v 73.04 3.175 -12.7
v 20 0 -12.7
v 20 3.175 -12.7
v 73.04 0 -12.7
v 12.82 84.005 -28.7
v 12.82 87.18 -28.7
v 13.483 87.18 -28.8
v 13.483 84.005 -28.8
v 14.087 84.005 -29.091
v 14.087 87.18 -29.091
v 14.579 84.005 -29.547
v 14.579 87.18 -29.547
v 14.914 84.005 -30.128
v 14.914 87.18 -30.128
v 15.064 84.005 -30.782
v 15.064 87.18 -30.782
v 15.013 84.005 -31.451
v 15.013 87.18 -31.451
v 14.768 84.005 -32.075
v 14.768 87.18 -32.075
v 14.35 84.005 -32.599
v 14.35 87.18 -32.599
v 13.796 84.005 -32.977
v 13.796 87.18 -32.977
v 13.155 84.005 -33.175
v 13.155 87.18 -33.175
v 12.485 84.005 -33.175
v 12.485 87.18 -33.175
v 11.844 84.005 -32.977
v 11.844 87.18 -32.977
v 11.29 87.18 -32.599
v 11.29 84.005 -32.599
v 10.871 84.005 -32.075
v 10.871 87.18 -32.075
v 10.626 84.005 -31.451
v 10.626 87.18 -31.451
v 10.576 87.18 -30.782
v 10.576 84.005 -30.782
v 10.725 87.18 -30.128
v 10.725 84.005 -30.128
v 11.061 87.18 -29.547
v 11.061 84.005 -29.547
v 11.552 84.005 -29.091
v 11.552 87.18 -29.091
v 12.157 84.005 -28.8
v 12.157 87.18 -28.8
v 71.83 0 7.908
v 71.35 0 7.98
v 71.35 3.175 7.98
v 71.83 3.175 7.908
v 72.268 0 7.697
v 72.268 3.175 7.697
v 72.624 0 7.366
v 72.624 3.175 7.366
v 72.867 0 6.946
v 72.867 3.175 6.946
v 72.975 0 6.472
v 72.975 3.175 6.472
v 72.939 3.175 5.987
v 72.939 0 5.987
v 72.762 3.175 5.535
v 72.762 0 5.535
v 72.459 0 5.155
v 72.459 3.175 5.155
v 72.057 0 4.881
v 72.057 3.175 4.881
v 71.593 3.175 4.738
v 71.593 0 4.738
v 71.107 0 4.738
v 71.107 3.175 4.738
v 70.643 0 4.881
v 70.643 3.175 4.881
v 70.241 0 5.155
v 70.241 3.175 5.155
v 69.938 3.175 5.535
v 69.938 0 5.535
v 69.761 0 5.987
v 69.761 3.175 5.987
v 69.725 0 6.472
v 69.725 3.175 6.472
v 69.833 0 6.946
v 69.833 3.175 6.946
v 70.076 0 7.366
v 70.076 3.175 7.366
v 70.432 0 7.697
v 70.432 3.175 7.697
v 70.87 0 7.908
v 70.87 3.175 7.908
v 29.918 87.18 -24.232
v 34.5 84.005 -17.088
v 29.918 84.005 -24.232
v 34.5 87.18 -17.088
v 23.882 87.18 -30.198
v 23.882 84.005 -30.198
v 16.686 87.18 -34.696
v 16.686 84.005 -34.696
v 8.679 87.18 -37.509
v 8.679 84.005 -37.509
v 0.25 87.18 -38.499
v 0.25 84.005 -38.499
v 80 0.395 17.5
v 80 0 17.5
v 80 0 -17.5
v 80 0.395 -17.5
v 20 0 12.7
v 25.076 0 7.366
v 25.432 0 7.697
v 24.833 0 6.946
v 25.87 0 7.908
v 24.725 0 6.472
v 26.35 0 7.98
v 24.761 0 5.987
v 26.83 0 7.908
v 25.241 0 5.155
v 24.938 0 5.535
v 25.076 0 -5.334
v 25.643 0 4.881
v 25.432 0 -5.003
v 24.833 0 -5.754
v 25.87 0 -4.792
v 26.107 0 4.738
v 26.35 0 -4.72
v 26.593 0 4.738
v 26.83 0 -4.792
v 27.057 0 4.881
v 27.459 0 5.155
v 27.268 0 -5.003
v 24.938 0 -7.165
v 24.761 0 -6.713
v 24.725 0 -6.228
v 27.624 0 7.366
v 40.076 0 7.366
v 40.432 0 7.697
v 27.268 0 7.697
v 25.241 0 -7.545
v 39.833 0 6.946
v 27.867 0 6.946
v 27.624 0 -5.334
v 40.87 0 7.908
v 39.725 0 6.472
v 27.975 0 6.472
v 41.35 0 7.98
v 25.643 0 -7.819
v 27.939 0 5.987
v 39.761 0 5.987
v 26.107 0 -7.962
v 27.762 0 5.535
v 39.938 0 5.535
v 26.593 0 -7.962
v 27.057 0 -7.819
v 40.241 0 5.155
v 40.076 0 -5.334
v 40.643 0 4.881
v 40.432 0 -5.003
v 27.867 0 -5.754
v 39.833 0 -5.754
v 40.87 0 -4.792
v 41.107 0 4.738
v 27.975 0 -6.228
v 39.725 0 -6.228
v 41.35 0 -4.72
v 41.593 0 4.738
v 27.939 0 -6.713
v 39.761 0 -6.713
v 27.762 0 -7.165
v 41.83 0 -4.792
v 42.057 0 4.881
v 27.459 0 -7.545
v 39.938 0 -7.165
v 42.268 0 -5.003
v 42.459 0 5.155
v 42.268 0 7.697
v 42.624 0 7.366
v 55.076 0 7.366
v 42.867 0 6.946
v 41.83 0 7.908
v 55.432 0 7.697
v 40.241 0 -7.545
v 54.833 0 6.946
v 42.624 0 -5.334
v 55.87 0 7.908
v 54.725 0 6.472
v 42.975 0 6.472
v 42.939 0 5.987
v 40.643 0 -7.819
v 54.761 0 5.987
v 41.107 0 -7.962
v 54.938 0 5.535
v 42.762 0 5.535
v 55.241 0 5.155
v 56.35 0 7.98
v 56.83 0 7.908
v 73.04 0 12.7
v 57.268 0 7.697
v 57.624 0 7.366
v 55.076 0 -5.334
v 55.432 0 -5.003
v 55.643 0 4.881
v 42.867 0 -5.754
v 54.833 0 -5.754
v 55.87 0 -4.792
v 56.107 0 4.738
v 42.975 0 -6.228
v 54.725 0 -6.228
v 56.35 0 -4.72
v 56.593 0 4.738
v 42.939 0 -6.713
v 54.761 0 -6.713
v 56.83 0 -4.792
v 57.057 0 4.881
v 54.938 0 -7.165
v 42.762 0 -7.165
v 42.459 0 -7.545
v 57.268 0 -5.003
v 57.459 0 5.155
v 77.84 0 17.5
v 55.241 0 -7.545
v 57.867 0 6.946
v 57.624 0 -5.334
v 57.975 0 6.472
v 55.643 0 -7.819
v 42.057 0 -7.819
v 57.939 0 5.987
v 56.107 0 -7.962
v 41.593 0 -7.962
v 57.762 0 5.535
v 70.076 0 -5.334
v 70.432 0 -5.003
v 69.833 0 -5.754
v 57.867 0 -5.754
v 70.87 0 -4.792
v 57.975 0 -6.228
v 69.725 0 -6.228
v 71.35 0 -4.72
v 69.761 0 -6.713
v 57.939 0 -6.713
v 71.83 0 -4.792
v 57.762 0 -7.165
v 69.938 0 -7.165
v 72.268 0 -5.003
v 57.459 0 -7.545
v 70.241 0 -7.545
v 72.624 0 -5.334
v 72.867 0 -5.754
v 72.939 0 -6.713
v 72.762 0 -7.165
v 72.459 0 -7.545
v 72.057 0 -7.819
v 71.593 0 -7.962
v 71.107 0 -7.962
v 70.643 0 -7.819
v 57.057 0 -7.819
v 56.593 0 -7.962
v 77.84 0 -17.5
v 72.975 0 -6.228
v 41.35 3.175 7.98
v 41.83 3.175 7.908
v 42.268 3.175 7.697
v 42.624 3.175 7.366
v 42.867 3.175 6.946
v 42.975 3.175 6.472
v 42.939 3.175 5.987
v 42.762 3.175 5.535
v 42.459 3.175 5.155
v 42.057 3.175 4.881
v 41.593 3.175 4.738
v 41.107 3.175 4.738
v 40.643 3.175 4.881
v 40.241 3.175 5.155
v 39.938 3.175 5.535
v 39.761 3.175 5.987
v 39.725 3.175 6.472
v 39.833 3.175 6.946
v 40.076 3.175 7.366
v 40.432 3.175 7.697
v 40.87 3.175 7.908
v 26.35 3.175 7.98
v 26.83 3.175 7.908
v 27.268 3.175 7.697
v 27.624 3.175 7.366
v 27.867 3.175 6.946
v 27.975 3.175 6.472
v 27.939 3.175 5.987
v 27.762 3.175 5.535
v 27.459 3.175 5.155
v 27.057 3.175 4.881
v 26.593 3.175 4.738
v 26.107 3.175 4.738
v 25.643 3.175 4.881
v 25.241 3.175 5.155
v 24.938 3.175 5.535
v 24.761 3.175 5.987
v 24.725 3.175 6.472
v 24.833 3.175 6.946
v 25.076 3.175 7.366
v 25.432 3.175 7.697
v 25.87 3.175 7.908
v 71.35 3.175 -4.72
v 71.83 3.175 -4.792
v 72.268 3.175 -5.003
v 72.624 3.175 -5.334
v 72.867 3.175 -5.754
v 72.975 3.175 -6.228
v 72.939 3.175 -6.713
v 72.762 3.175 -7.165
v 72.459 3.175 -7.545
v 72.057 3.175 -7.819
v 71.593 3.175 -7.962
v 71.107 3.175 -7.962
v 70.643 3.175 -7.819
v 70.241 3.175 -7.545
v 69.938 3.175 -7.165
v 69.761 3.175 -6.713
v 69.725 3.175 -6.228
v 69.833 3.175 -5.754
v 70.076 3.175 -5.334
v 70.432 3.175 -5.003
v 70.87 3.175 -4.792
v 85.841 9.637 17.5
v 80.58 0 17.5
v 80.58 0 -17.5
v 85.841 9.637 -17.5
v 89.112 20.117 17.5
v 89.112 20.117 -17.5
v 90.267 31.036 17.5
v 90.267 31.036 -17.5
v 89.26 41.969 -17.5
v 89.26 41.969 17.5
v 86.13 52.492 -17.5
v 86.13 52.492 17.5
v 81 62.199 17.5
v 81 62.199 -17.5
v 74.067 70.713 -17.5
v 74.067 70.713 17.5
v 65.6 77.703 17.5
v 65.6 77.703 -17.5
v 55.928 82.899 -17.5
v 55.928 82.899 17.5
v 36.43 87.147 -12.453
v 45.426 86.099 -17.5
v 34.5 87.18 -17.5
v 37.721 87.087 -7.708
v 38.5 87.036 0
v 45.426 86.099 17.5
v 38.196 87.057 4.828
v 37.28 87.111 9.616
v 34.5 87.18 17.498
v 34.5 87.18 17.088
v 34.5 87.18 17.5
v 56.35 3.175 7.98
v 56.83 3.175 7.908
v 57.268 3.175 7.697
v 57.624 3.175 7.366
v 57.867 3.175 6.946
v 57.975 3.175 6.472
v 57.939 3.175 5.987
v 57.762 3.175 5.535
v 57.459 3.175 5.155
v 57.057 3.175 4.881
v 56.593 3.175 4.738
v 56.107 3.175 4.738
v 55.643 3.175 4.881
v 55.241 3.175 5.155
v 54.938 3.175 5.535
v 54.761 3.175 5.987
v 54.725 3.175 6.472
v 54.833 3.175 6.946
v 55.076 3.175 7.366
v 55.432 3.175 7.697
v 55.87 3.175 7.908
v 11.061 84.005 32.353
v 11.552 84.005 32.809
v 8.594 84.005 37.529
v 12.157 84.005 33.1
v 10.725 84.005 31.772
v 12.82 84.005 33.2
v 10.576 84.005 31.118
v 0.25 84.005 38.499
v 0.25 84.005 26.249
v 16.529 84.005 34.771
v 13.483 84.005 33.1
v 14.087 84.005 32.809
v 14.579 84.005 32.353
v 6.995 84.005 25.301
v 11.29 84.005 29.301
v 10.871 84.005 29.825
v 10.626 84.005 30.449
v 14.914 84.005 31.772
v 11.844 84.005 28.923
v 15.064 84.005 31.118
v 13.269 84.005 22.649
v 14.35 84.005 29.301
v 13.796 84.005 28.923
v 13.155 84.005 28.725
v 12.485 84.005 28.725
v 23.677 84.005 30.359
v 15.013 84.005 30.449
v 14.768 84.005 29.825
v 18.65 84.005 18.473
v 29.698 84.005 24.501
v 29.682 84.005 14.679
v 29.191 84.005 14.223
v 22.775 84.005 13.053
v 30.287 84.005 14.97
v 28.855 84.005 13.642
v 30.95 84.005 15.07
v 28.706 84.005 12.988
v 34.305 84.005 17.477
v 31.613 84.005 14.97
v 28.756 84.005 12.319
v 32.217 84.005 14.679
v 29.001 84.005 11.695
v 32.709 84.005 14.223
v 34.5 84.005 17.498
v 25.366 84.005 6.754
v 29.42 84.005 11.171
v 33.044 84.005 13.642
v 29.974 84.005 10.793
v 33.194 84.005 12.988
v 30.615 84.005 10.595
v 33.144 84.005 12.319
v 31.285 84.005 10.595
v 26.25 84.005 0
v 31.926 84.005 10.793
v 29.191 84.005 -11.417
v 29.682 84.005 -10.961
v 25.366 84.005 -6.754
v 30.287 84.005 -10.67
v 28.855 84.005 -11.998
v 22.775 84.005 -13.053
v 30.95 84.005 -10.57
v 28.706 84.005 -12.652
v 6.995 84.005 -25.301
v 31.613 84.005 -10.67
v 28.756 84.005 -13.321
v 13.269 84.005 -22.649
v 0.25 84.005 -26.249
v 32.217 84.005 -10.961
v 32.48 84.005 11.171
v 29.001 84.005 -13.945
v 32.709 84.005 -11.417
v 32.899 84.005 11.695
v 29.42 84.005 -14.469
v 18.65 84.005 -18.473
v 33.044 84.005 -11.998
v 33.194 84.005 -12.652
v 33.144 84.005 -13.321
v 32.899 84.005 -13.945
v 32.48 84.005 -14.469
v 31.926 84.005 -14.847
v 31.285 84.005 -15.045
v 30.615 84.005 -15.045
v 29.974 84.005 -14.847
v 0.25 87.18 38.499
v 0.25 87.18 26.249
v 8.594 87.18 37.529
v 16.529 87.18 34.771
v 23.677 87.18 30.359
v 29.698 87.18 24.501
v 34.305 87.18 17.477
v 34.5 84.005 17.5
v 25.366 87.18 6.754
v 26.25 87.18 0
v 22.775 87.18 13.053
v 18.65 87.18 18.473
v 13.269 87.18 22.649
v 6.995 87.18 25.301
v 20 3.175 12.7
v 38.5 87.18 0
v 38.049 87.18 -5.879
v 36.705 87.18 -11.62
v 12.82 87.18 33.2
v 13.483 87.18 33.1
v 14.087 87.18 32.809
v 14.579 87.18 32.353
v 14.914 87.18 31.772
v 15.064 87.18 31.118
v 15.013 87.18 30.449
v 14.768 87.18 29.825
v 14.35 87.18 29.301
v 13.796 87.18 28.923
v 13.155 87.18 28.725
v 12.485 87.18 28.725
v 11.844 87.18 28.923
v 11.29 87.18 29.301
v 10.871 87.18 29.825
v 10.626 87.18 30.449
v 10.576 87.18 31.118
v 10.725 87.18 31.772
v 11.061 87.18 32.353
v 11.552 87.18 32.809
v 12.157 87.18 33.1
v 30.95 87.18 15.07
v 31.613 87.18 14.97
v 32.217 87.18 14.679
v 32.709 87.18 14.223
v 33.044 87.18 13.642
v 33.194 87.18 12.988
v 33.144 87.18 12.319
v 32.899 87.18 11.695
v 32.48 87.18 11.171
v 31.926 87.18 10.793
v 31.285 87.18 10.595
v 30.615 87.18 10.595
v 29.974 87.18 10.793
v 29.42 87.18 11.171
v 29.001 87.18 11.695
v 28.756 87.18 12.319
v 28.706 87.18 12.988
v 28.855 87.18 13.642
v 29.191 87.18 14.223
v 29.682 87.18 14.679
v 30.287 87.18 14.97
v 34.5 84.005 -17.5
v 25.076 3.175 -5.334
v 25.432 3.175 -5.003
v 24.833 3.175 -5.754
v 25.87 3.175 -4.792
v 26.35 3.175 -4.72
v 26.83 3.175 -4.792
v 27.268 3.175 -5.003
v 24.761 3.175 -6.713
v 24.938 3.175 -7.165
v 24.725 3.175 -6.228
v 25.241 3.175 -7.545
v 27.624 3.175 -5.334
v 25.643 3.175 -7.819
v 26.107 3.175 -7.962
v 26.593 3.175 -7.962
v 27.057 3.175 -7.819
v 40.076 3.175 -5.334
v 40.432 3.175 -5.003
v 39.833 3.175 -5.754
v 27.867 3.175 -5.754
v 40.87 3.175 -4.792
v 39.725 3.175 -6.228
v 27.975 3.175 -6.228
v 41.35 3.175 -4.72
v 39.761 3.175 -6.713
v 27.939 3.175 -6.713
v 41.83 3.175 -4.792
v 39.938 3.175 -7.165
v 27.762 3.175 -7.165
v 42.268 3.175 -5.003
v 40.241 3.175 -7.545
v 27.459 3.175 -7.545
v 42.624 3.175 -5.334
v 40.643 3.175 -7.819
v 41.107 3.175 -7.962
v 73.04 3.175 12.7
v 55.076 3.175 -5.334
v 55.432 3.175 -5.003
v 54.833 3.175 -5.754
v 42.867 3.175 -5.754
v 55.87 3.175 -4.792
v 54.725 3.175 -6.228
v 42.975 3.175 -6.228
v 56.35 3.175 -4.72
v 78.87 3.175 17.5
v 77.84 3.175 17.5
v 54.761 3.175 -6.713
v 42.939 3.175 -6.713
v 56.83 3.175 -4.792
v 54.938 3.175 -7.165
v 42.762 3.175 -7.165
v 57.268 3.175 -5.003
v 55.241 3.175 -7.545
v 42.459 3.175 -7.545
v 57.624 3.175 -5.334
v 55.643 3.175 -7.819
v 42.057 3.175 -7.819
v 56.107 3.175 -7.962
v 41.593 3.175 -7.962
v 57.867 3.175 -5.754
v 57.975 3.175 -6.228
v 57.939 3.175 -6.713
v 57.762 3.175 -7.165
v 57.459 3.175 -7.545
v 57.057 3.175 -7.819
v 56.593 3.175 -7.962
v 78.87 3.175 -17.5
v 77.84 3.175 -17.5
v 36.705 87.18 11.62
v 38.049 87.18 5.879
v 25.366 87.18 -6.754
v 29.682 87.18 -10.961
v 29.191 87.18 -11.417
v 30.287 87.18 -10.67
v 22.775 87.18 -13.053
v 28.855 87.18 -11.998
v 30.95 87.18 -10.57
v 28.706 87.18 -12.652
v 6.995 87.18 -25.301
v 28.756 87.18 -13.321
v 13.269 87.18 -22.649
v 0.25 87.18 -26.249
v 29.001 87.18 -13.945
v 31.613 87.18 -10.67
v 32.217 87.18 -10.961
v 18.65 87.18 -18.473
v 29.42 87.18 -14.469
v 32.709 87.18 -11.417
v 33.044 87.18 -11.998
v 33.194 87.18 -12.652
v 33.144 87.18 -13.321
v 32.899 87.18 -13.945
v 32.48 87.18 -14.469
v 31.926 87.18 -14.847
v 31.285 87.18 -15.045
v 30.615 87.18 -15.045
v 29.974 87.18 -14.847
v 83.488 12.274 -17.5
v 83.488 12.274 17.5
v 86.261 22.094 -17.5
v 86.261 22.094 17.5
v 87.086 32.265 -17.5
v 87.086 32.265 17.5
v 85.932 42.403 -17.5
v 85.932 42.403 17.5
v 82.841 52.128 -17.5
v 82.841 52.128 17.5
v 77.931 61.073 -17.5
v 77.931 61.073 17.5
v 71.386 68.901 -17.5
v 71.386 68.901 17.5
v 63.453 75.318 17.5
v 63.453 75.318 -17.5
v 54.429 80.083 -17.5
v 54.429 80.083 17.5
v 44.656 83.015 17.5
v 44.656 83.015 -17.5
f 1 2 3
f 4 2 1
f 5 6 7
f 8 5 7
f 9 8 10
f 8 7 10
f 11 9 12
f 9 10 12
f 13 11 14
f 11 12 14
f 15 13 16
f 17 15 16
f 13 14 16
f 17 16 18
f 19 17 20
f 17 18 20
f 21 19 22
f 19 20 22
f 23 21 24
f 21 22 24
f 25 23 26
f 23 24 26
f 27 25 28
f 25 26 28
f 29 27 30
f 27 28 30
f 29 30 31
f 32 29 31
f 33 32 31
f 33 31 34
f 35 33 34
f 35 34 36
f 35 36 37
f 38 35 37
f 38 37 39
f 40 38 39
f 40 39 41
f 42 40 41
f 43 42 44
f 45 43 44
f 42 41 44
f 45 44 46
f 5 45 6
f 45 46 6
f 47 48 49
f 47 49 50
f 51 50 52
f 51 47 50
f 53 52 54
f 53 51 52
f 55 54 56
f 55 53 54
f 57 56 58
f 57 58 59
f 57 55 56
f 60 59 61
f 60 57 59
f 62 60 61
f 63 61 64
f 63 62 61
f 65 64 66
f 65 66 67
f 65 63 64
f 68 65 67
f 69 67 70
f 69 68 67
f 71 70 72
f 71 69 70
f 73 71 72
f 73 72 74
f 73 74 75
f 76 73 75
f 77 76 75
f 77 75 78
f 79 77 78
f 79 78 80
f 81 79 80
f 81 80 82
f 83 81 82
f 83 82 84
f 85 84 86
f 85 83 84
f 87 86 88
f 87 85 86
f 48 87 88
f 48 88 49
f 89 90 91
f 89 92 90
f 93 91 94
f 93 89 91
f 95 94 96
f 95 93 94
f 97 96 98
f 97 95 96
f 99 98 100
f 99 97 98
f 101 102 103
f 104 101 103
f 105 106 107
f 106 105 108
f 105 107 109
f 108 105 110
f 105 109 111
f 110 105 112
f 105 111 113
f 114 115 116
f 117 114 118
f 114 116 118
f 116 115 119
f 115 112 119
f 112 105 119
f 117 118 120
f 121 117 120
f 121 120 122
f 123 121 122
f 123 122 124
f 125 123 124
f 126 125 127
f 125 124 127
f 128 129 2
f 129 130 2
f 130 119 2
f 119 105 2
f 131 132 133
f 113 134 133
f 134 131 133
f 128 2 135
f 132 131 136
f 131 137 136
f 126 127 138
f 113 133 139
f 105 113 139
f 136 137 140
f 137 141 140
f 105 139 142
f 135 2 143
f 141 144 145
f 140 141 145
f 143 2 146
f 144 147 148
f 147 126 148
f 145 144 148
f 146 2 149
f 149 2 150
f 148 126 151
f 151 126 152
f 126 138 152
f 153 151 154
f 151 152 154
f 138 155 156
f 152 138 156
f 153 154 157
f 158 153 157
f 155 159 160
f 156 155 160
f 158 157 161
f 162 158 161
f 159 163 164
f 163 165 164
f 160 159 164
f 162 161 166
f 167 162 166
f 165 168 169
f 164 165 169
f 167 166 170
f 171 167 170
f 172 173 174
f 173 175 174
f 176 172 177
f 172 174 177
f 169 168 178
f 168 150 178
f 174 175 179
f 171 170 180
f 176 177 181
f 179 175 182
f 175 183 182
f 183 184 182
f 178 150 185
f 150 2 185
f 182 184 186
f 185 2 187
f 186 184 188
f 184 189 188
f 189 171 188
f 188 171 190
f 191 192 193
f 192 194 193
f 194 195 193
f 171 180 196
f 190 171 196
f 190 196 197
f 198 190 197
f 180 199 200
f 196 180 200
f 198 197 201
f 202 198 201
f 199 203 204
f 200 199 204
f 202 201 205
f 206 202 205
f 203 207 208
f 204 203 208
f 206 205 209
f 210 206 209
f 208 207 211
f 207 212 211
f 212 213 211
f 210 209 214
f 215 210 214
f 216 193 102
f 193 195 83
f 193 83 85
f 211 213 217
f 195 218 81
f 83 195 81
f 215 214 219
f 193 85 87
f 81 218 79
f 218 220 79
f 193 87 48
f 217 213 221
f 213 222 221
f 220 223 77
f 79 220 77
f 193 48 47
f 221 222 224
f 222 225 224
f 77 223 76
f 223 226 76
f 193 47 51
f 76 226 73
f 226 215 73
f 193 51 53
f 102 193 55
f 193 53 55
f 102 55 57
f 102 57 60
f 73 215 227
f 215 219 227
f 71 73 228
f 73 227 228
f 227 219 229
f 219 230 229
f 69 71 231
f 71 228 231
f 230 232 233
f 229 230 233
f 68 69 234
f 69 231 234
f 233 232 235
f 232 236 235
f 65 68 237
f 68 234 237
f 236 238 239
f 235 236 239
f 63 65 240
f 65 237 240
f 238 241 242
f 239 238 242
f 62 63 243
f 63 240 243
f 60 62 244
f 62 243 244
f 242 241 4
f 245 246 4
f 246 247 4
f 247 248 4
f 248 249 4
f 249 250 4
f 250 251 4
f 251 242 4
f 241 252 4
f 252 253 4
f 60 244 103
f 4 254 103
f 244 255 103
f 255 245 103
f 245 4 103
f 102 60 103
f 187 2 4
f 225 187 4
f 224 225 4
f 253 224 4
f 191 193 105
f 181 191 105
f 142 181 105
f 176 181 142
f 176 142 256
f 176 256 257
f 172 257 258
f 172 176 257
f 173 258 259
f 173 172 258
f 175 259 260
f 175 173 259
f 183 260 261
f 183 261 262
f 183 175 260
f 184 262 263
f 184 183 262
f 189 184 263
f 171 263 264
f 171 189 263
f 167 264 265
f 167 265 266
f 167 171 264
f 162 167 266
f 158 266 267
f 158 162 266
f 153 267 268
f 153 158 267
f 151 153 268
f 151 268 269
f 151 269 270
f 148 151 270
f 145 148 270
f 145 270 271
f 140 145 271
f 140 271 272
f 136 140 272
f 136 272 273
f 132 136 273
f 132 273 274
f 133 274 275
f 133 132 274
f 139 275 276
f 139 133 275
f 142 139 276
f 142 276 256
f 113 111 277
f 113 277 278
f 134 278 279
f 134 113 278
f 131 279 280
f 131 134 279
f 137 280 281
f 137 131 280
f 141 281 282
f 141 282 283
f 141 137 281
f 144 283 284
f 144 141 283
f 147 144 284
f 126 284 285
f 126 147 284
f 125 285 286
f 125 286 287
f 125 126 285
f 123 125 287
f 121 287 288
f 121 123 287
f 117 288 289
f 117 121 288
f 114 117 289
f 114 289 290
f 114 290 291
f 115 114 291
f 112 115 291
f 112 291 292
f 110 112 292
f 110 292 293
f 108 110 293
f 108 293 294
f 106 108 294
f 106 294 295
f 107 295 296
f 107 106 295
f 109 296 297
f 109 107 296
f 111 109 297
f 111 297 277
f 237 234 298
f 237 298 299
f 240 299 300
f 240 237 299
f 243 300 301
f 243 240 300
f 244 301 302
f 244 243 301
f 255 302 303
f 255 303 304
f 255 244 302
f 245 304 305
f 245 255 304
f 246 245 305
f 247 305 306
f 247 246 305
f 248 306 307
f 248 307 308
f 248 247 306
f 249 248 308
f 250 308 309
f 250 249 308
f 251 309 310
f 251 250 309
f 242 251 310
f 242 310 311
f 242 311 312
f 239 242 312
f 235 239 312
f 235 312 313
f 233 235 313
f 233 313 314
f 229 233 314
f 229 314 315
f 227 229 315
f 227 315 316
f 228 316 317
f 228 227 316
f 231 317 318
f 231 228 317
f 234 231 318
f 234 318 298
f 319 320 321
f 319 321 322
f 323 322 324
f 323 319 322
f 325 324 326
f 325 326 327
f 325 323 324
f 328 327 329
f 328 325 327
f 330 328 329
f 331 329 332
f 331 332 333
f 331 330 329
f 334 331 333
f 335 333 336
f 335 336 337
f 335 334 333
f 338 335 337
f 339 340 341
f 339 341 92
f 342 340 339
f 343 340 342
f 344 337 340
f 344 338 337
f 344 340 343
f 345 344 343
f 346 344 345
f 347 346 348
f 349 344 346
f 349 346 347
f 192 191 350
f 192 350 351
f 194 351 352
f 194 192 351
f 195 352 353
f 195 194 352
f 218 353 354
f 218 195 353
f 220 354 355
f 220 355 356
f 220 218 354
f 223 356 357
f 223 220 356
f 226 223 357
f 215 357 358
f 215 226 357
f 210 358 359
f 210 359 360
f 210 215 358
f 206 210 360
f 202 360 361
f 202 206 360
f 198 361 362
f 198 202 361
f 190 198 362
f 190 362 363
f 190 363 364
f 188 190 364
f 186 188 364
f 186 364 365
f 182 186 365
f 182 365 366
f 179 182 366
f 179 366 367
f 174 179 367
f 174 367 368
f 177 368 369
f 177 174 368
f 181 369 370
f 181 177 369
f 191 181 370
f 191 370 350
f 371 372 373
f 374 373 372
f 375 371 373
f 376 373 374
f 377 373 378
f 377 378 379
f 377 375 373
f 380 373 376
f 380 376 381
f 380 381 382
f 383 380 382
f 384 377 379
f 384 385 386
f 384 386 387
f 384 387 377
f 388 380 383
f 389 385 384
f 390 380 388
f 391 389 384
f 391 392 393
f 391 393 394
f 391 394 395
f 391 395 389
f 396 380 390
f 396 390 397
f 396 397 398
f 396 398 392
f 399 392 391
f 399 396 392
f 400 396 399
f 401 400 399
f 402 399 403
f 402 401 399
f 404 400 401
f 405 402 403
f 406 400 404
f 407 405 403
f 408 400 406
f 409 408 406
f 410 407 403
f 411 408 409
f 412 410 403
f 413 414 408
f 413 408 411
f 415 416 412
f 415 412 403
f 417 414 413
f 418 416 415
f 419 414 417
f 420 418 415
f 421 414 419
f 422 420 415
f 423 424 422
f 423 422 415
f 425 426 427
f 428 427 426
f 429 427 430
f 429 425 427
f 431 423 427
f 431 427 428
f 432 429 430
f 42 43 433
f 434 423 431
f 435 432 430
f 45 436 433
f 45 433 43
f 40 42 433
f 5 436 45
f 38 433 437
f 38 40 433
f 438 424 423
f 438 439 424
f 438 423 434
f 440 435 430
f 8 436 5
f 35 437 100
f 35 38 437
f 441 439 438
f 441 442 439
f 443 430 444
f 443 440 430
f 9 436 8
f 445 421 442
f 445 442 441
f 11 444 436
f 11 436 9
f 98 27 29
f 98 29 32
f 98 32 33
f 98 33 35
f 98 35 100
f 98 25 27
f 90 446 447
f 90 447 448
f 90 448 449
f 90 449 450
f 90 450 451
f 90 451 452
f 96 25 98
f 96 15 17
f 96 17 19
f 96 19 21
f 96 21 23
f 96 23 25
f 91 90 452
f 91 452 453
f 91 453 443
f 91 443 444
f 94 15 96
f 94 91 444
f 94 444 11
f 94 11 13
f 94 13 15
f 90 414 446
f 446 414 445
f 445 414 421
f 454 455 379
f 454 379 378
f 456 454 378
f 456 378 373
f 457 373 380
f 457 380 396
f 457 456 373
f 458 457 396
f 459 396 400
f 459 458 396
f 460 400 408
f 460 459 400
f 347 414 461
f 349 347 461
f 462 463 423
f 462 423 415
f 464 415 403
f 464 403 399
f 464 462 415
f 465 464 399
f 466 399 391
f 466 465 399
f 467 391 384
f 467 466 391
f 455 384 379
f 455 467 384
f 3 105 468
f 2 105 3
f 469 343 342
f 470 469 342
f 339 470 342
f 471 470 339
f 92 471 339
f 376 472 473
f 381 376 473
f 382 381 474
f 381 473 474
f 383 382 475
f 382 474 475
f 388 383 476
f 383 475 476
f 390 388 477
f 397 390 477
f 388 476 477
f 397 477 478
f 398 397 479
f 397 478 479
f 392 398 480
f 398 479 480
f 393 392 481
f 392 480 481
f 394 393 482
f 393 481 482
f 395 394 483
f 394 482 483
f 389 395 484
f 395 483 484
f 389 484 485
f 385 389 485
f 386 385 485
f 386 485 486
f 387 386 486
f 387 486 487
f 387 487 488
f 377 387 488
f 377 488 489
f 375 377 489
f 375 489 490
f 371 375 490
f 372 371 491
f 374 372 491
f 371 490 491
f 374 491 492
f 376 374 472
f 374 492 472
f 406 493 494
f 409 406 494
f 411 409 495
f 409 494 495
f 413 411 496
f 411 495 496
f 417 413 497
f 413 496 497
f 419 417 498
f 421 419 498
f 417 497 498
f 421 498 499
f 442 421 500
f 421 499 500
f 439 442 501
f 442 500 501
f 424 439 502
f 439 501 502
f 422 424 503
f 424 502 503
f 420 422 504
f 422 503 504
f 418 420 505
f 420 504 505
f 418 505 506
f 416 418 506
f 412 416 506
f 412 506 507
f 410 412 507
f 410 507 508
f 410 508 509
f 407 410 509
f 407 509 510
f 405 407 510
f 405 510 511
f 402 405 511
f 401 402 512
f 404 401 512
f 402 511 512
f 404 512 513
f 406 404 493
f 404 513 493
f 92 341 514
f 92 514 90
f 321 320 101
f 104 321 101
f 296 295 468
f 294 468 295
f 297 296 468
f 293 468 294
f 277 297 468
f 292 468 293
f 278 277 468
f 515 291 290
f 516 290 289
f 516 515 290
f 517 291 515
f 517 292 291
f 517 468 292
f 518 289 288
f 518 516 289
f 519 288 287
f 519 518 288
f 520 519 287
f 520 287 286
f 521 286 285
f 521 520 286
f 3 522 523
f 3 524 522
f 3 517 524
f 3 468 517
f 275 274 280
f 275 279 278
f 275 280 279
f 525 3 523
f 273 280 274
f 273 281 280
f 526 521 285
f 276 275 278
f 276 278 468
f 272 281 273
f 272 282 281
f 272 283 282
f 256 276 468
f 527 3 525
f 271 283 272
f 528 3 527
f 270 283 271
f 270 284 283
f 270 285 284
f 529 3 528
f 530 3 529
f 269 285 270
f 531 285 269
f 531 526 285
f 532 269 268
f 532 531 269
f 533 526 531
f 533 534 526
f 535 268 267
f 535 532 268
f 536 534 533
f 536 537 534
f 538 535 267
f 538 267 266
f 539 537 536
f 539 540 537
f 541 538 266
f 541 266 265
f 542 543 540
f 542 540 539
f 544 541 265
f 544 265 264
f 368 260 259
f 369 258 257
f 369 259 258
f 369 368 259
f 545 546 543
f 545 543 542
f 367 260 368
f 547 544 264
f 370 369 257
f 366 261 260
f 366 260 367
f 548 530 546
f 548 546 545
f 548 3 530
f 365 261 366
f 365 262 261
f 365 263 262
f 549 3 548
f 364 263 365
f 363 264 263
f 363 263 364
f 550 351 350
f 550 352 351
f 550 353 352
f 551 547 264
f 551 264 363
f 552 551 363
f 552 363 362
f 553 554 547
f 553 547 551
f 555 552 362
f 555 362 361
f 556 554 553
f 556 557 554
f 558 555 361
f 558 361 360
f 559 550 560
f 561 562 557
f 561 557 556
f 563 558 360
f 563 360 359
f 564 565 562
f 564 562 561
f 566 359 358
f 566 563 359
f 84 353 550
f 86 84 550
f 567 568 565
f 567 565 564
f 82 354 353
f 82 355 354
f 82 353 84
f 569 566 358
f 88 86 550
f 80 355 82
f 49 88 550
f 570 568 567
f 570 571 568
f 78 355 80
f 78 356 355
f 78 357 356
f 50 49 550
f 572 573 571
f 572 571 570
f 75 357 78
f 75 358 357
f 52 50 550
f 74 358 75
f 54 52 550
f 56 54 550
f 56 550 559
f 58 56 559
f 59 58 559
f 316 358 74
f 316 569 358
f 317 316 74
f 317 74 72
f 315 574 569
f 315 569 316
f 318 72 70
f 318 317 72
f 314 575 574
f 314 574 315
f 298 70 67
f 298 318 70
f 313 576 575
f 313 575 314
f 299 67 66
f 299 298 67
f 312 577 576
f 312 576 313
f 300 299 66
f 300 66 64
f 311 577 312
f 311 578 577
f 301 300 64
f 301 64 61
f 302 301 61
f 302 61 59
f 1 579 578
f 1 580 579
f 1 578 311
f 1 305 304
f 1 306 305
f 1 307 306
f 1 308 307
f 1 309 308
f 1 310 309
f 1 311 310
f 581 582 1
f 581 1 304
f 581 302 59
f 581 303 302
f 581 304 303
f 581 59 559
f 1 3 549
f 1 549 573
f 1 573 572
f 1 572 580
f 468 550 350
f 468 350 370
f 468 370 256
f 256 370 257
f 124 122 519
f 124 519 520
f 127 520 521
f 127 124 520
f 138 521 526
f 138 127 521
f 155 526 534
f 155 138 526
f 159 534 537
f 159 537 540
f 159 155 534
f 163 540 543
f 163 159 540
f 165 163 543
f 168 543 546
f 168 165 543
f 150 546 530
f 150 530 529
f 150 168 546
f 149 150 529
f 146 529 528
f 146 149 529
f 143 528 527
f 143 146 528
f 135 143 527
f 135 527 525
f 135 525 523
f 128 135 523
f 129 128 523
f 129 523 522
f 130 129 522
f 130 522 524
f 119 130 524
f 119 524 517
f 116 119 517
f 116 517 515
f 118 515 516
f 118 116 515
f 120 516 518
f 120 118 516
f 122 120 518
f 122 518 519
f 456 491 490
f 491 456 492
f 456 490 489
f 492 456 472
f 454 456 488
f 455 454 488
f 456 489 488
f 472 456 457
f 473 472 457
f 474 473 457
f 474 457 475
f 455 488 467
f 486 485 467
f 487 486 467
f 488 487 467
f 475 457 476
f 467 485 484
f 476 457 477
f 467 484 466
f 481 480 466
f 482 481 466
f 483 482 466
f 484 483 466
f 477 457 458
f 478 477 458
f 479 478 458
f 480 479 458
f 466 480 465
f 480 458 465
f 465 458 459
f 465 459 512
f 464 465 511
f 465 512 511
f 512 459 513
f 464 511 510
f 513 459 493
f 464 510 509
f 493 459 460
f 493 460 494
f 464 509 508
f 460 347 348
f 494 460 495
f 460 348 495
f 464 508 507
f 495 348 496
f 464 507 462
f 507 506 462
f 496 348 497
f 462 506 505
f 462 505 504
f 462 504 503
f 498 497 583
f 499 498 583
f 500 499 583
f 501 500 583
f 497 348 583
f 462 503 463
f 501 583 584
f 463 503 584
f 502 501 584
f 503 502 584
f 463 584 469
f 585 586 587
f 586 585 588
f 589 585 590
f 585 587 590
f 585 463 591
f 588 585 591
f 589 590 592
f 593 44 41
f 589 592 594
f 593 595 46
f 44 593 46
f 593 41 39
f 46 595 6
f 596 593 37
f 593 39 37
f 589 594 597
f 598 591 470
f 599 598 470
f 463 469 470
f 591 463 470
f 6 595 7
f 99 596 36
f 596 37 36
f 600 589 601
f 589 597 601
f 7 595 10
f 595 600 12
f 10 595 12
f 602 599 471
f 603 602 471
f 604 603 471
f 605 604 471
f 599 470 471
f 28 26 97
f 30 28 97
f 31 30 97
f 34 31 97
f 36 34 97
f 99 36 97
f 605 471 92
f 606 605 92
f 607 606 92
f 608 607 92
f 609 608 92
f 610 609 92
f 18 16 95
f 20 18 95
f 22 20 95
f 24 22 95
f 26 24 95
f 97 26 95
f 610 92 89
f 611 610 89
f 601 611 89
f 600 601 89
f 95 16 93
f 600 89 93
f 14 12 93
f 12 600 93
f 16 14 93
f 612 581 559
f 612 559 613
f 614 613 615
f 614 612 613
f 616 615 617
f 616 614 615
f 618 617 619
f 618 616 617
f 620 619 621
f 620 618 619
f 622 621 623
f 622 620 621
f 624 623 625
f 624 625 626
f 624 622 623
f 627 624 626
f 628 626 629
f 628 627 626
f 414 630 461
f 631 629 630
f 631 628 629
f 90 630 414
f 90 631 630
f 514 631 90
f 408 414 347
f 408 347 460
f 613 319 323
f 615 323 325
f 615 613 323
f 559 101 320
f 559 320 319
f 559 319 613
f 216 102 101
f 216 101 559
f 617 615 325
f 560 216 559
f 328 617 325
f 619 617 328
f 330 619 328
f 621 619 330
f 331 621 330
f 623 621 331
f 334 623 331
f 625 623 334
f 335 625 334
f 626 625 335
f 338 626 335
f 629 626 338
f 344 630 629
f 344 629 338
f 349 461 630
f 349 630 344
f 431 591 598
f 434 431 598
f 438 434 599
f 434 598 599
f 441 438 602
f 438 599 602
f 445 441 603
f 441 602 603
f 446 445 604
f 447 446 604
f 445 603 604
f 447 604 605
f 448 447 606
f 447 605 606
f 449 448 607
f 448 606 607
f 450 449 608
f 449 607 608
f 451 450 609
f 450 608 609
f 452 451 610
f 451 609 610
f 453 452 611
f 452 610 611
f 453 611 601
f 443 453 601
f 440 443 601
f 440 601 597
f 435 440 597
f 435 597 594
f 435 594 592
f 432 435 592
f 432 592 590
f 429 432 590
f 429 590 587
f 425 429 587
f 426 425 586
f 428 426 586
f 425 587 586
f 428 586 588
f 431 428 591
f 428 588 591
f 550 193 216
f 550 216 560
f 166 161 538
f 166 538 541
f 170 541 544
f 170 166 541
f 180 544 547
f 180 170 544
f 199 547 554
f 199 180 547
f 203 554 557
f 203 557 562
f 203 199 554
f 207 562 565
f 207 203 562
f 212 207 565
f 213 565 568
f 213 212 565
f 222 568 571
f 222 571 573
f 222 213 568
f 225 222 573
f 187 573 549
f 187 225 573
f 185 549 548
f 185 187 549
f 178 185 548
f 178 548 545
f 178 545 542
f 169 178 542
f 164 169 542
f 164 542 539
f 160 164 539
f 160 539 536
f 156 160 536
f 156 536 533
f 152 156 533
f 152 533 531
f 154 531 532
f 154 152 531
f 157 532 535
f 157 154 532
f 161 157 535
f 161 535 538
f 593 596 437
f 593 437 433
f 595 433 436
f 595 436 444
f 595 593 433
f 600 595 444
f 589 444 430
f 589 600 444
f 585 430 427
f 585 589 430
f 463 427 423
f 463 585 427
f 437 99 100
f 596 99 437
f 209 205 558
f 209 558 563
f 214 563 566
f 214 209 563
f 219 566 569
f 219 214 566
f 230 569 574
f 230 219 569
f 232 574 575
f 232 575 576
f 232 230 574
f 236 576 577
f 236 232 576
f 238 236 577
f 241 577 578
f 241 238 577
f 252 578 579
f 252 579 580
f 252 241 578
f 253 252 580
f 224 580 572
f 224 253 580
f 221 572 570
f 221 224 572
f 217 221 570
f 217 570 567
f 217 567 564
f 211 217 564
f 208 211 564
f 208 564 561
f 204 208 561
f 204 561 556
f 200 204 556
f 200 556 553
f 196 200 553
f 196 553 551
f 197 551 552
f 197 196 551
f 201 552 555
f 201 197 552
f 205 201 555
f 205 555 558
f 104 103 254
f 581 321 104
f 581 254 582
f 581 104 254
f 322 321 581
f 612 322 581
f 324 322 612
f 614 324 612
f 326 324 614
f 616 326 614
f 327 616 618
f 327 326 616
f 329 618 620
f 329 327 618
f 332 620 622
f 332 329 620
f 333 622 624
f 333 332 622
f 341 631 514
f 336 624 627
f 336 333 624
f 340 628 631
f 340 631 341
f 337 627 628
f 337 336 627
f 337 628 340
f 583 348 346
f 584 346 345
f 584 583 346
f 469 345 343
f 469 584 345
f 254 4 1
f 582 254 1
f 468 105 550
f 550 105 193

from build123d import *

# Parameters (mm, degrees)
SKETCH2_R               = 2.25
BOSS_EXTRUDE1_DEPTH     = 3.175
SKETCH1_W               = 2.16
SKETCH1_H               = 4.8
SKETCH1_H_2             = 25.4
SKETCH1_W_2             = 57.84
SKETCH1_R               = 1.63
BOSS_EXTRUDE2_DEPTH     = 3.175
TOP_CONNECTION_SKETCH_W = 35
TOP_CONNECTION_SKETCH_H = 3.175
CHAMFER1_SIZE           = 4.8
CHAMFER2_SIZE           = 0.41
CHAMFER2_SIZE_2         = 0.434896144


# Some blends are built 0.0001 mm under size
with BuildPart() as part:
    # Sketch2 → Boss-Extrude1 (new body)
    with BuildSketch(Plane(origin=(0, 87.18, 0), x_dir=(1, 0, 0), z_dir=(0, 1, 0))):
        with BuildLine():
            ThreePointArc((38.5, 0), (27.3118564, 27.135078773), (0.25, 38.499188303))
            Line((0.25, 38.499188303), (0.25, 26.248809497))
            ThreePointArc((0.25, 26.248809497), (18.649731902, 18.472953202), (26.25, 0))
            ThreePointArc((26.25, 0), (18.649731902, -18.472953202), (0.25, -26.248809497))
            Line((0.25, -26.248809497), (0.25, -38.499188303))
            ThreePointArc((0.25, -38.499188303), (27.3118564, -27.135078773), (38.5, 0))
        make_face()
        with Locations(Location((12.819894984, -30.949964339, 0), (0, 0, 270))):
            Circle(SKETCH2_R, mode=Mode.SUBTRACT)
        with Locations(Location((30.949964339, -12.819894984, 0), (0, 0, 270))):
            Circle(SKETCH2_R, mode=Mode.SUBTRACT)
        with Locations(Location((30.949964339, 12.819894984, 0), (0, 0, 270))):
            Circle(SKETCH2_R, mode=Mode.SUBTRACT)
        with Locations(Location((12.819894984, 30.949964339, 0), (0, 0, 270))):
            Circle(SKETCH2_R, mode=Mode.SUBTRACT)
    extrude(amount=-BOSS_EXTRUDE1_DEPTH)



with BuildPart() as body_2:
    # Sketch1 → Boss-Extrude2 (new body)
    # profile 1 of 4: a face of its own
    with BuildSketch(Plane(origin=(0, 0, 0), x_dir=(1, 0, 0), z_dir=(0, 1, 0))):
        with Locations((78.92, 15.1)):
            Rectangle(SKETCH1_W, SKETCH1_H)
    # profile 2 of 4: a face of its own
    with BuildSketch(Plane(origin=(0, 0, 0), x_dir=(1, 0, 0), z_dir=(0, 1, 0))):
        with Locations((78.92, 0)):
            Rectangle(SKETCH1_W, SKETCH1_H_2)
    # profile 3 of 4: a face of its own
    with BuildSketch(Plane(origin=(0, 0, 0), x_dir=(1, 0, 0), z_dir=(0, 1, 0))):
        with Locations((48.92, 0)):
            Rectangle(SKETCH1_W_2, SKETCH1_H_2)
        with Locations(Location((26.35, -6.35, 0), (0, 0, 270))):
            Circle(SKETCH1_R, mode=Mode.SUBTRACT)
        with Locations(Location((41.35, -6.35, 0), (0, 0, 270))):
            Circle(SKETCH1_R, mode=Mode.SUBTRACT)
        with Locations(Location((56.35, -6.35, 0), (0, 0, 270))):
            Circle(SKETCH1_R, mode=Mode.SUBTRACT)
        with Locations(Location((71.35, -6.35, 0), (0, 0, 270))):
            Circle(SKETCH1_R, mode=Mode.SUBTRACT)
        with Locations(Location((26.35, 6.35, 0), (0, 0, 270))):
            Circle(SKETCH1_R, mode=Mode.SUBTRACT)
        with Locations(Location((41.35, 6.35, 0), (0, 0, 270))):
            Circle(SKETCH1_R, mode=Mode.SUBTRACT)
        with Locations(Location((56.35, 6.35, 0), (0, 0, 270))):
            Circle(SKETCH1_R, mode=Mode.SUBTRACT)
        with Locations(Location((71.35, 6.35, 0), (0, 0, 270))):
            Circle(SKETCH1_R, mode=Mode.SUBTRACT)
    # profile 4 of 4: a face of its own
    with BuildSketch(Plane(origin=(0, 0, 0), x_dir=(1, 0, 0), z_dir=(0, 1, 0))):
        with Locations((78.92, -15.1)):
            Rectangle(SKETCH1_W, SKETCH1_H)
    extrude(amount=BOSS_EXTRUDE2_DEPTH)


with BuildPart() as part_1:
    add(part.part)

    add(body_2.part)  # Sweep2 merges body 2
    # Sweep2: sweep along a curve in space
    with BuildLine() as sweep2_path:
        ThreePointArc((80.58, 0, 17.5), (83.80445923, 57.472384507, 17.5), (34.5, 87.18, 17.5))
    # Top_Connection_Sketch → Sweep2 (sweep)
    with BuildSketch(Plane(origin=(34.5, 0, 0), x_dir=(0, 0, -1), z_dir=(1, 0, 0))):
        with Locations((0, 85.5925)):
            Rectangle(TOP_CONNECTION_SKETCH_W, TOP_CONNECTION_SKETCH_H)
    sweep(path=sweep2_path.line)

    # Chamfer1
    chamfer1_edges = [part_1.edges().sort_by_distance(p)[0] for p in [
        (77.84, 1.5875, -12.7),
        (77.84, 1.5875, 12.7),
    ]]
    chamfer(chamfer1_edges, length=CHAMFER1_SIZE - 0.0001)  # a hair under: the kernel refuses the full size

    # Chamfer2
    # the kernel refuses this chamfer: 0.434896144, 0.41 mm, written as the material it adds along each edge
    with BuildSketch(Plane(origin=(34.5, 84.005, 17.088007491), x_dir=(0.04194571569864223, 0, 0.9991198911714894), z_dir=(0, 1, 0))) as chamfer2_piece_1:
        with BuildLine():
            Line((CHAMFER2_SIZE * 0.999119891171, -CHAMFER2_SIZE * 0.0419457156986), (CHAMFER2_SIZE_2 * 0.873966952265, -CHAMFER2_SIZE_2 * 0.485985357052))
            ThreePointArc((CHAMFER2_SIZE_2 * 0.873966952265, -CHAMFER2_SIZE_2 * 0.485985357052), (0.192993875, -0.106615288), (0, 0))
            Line((0, 0), (CHAMFER2_SIZE * 0.999119891171, -CHAMFER2_SIZE * 0.0419457156986))
        make_face()
    extrude(amount=3.175)


solid = part_1.part
